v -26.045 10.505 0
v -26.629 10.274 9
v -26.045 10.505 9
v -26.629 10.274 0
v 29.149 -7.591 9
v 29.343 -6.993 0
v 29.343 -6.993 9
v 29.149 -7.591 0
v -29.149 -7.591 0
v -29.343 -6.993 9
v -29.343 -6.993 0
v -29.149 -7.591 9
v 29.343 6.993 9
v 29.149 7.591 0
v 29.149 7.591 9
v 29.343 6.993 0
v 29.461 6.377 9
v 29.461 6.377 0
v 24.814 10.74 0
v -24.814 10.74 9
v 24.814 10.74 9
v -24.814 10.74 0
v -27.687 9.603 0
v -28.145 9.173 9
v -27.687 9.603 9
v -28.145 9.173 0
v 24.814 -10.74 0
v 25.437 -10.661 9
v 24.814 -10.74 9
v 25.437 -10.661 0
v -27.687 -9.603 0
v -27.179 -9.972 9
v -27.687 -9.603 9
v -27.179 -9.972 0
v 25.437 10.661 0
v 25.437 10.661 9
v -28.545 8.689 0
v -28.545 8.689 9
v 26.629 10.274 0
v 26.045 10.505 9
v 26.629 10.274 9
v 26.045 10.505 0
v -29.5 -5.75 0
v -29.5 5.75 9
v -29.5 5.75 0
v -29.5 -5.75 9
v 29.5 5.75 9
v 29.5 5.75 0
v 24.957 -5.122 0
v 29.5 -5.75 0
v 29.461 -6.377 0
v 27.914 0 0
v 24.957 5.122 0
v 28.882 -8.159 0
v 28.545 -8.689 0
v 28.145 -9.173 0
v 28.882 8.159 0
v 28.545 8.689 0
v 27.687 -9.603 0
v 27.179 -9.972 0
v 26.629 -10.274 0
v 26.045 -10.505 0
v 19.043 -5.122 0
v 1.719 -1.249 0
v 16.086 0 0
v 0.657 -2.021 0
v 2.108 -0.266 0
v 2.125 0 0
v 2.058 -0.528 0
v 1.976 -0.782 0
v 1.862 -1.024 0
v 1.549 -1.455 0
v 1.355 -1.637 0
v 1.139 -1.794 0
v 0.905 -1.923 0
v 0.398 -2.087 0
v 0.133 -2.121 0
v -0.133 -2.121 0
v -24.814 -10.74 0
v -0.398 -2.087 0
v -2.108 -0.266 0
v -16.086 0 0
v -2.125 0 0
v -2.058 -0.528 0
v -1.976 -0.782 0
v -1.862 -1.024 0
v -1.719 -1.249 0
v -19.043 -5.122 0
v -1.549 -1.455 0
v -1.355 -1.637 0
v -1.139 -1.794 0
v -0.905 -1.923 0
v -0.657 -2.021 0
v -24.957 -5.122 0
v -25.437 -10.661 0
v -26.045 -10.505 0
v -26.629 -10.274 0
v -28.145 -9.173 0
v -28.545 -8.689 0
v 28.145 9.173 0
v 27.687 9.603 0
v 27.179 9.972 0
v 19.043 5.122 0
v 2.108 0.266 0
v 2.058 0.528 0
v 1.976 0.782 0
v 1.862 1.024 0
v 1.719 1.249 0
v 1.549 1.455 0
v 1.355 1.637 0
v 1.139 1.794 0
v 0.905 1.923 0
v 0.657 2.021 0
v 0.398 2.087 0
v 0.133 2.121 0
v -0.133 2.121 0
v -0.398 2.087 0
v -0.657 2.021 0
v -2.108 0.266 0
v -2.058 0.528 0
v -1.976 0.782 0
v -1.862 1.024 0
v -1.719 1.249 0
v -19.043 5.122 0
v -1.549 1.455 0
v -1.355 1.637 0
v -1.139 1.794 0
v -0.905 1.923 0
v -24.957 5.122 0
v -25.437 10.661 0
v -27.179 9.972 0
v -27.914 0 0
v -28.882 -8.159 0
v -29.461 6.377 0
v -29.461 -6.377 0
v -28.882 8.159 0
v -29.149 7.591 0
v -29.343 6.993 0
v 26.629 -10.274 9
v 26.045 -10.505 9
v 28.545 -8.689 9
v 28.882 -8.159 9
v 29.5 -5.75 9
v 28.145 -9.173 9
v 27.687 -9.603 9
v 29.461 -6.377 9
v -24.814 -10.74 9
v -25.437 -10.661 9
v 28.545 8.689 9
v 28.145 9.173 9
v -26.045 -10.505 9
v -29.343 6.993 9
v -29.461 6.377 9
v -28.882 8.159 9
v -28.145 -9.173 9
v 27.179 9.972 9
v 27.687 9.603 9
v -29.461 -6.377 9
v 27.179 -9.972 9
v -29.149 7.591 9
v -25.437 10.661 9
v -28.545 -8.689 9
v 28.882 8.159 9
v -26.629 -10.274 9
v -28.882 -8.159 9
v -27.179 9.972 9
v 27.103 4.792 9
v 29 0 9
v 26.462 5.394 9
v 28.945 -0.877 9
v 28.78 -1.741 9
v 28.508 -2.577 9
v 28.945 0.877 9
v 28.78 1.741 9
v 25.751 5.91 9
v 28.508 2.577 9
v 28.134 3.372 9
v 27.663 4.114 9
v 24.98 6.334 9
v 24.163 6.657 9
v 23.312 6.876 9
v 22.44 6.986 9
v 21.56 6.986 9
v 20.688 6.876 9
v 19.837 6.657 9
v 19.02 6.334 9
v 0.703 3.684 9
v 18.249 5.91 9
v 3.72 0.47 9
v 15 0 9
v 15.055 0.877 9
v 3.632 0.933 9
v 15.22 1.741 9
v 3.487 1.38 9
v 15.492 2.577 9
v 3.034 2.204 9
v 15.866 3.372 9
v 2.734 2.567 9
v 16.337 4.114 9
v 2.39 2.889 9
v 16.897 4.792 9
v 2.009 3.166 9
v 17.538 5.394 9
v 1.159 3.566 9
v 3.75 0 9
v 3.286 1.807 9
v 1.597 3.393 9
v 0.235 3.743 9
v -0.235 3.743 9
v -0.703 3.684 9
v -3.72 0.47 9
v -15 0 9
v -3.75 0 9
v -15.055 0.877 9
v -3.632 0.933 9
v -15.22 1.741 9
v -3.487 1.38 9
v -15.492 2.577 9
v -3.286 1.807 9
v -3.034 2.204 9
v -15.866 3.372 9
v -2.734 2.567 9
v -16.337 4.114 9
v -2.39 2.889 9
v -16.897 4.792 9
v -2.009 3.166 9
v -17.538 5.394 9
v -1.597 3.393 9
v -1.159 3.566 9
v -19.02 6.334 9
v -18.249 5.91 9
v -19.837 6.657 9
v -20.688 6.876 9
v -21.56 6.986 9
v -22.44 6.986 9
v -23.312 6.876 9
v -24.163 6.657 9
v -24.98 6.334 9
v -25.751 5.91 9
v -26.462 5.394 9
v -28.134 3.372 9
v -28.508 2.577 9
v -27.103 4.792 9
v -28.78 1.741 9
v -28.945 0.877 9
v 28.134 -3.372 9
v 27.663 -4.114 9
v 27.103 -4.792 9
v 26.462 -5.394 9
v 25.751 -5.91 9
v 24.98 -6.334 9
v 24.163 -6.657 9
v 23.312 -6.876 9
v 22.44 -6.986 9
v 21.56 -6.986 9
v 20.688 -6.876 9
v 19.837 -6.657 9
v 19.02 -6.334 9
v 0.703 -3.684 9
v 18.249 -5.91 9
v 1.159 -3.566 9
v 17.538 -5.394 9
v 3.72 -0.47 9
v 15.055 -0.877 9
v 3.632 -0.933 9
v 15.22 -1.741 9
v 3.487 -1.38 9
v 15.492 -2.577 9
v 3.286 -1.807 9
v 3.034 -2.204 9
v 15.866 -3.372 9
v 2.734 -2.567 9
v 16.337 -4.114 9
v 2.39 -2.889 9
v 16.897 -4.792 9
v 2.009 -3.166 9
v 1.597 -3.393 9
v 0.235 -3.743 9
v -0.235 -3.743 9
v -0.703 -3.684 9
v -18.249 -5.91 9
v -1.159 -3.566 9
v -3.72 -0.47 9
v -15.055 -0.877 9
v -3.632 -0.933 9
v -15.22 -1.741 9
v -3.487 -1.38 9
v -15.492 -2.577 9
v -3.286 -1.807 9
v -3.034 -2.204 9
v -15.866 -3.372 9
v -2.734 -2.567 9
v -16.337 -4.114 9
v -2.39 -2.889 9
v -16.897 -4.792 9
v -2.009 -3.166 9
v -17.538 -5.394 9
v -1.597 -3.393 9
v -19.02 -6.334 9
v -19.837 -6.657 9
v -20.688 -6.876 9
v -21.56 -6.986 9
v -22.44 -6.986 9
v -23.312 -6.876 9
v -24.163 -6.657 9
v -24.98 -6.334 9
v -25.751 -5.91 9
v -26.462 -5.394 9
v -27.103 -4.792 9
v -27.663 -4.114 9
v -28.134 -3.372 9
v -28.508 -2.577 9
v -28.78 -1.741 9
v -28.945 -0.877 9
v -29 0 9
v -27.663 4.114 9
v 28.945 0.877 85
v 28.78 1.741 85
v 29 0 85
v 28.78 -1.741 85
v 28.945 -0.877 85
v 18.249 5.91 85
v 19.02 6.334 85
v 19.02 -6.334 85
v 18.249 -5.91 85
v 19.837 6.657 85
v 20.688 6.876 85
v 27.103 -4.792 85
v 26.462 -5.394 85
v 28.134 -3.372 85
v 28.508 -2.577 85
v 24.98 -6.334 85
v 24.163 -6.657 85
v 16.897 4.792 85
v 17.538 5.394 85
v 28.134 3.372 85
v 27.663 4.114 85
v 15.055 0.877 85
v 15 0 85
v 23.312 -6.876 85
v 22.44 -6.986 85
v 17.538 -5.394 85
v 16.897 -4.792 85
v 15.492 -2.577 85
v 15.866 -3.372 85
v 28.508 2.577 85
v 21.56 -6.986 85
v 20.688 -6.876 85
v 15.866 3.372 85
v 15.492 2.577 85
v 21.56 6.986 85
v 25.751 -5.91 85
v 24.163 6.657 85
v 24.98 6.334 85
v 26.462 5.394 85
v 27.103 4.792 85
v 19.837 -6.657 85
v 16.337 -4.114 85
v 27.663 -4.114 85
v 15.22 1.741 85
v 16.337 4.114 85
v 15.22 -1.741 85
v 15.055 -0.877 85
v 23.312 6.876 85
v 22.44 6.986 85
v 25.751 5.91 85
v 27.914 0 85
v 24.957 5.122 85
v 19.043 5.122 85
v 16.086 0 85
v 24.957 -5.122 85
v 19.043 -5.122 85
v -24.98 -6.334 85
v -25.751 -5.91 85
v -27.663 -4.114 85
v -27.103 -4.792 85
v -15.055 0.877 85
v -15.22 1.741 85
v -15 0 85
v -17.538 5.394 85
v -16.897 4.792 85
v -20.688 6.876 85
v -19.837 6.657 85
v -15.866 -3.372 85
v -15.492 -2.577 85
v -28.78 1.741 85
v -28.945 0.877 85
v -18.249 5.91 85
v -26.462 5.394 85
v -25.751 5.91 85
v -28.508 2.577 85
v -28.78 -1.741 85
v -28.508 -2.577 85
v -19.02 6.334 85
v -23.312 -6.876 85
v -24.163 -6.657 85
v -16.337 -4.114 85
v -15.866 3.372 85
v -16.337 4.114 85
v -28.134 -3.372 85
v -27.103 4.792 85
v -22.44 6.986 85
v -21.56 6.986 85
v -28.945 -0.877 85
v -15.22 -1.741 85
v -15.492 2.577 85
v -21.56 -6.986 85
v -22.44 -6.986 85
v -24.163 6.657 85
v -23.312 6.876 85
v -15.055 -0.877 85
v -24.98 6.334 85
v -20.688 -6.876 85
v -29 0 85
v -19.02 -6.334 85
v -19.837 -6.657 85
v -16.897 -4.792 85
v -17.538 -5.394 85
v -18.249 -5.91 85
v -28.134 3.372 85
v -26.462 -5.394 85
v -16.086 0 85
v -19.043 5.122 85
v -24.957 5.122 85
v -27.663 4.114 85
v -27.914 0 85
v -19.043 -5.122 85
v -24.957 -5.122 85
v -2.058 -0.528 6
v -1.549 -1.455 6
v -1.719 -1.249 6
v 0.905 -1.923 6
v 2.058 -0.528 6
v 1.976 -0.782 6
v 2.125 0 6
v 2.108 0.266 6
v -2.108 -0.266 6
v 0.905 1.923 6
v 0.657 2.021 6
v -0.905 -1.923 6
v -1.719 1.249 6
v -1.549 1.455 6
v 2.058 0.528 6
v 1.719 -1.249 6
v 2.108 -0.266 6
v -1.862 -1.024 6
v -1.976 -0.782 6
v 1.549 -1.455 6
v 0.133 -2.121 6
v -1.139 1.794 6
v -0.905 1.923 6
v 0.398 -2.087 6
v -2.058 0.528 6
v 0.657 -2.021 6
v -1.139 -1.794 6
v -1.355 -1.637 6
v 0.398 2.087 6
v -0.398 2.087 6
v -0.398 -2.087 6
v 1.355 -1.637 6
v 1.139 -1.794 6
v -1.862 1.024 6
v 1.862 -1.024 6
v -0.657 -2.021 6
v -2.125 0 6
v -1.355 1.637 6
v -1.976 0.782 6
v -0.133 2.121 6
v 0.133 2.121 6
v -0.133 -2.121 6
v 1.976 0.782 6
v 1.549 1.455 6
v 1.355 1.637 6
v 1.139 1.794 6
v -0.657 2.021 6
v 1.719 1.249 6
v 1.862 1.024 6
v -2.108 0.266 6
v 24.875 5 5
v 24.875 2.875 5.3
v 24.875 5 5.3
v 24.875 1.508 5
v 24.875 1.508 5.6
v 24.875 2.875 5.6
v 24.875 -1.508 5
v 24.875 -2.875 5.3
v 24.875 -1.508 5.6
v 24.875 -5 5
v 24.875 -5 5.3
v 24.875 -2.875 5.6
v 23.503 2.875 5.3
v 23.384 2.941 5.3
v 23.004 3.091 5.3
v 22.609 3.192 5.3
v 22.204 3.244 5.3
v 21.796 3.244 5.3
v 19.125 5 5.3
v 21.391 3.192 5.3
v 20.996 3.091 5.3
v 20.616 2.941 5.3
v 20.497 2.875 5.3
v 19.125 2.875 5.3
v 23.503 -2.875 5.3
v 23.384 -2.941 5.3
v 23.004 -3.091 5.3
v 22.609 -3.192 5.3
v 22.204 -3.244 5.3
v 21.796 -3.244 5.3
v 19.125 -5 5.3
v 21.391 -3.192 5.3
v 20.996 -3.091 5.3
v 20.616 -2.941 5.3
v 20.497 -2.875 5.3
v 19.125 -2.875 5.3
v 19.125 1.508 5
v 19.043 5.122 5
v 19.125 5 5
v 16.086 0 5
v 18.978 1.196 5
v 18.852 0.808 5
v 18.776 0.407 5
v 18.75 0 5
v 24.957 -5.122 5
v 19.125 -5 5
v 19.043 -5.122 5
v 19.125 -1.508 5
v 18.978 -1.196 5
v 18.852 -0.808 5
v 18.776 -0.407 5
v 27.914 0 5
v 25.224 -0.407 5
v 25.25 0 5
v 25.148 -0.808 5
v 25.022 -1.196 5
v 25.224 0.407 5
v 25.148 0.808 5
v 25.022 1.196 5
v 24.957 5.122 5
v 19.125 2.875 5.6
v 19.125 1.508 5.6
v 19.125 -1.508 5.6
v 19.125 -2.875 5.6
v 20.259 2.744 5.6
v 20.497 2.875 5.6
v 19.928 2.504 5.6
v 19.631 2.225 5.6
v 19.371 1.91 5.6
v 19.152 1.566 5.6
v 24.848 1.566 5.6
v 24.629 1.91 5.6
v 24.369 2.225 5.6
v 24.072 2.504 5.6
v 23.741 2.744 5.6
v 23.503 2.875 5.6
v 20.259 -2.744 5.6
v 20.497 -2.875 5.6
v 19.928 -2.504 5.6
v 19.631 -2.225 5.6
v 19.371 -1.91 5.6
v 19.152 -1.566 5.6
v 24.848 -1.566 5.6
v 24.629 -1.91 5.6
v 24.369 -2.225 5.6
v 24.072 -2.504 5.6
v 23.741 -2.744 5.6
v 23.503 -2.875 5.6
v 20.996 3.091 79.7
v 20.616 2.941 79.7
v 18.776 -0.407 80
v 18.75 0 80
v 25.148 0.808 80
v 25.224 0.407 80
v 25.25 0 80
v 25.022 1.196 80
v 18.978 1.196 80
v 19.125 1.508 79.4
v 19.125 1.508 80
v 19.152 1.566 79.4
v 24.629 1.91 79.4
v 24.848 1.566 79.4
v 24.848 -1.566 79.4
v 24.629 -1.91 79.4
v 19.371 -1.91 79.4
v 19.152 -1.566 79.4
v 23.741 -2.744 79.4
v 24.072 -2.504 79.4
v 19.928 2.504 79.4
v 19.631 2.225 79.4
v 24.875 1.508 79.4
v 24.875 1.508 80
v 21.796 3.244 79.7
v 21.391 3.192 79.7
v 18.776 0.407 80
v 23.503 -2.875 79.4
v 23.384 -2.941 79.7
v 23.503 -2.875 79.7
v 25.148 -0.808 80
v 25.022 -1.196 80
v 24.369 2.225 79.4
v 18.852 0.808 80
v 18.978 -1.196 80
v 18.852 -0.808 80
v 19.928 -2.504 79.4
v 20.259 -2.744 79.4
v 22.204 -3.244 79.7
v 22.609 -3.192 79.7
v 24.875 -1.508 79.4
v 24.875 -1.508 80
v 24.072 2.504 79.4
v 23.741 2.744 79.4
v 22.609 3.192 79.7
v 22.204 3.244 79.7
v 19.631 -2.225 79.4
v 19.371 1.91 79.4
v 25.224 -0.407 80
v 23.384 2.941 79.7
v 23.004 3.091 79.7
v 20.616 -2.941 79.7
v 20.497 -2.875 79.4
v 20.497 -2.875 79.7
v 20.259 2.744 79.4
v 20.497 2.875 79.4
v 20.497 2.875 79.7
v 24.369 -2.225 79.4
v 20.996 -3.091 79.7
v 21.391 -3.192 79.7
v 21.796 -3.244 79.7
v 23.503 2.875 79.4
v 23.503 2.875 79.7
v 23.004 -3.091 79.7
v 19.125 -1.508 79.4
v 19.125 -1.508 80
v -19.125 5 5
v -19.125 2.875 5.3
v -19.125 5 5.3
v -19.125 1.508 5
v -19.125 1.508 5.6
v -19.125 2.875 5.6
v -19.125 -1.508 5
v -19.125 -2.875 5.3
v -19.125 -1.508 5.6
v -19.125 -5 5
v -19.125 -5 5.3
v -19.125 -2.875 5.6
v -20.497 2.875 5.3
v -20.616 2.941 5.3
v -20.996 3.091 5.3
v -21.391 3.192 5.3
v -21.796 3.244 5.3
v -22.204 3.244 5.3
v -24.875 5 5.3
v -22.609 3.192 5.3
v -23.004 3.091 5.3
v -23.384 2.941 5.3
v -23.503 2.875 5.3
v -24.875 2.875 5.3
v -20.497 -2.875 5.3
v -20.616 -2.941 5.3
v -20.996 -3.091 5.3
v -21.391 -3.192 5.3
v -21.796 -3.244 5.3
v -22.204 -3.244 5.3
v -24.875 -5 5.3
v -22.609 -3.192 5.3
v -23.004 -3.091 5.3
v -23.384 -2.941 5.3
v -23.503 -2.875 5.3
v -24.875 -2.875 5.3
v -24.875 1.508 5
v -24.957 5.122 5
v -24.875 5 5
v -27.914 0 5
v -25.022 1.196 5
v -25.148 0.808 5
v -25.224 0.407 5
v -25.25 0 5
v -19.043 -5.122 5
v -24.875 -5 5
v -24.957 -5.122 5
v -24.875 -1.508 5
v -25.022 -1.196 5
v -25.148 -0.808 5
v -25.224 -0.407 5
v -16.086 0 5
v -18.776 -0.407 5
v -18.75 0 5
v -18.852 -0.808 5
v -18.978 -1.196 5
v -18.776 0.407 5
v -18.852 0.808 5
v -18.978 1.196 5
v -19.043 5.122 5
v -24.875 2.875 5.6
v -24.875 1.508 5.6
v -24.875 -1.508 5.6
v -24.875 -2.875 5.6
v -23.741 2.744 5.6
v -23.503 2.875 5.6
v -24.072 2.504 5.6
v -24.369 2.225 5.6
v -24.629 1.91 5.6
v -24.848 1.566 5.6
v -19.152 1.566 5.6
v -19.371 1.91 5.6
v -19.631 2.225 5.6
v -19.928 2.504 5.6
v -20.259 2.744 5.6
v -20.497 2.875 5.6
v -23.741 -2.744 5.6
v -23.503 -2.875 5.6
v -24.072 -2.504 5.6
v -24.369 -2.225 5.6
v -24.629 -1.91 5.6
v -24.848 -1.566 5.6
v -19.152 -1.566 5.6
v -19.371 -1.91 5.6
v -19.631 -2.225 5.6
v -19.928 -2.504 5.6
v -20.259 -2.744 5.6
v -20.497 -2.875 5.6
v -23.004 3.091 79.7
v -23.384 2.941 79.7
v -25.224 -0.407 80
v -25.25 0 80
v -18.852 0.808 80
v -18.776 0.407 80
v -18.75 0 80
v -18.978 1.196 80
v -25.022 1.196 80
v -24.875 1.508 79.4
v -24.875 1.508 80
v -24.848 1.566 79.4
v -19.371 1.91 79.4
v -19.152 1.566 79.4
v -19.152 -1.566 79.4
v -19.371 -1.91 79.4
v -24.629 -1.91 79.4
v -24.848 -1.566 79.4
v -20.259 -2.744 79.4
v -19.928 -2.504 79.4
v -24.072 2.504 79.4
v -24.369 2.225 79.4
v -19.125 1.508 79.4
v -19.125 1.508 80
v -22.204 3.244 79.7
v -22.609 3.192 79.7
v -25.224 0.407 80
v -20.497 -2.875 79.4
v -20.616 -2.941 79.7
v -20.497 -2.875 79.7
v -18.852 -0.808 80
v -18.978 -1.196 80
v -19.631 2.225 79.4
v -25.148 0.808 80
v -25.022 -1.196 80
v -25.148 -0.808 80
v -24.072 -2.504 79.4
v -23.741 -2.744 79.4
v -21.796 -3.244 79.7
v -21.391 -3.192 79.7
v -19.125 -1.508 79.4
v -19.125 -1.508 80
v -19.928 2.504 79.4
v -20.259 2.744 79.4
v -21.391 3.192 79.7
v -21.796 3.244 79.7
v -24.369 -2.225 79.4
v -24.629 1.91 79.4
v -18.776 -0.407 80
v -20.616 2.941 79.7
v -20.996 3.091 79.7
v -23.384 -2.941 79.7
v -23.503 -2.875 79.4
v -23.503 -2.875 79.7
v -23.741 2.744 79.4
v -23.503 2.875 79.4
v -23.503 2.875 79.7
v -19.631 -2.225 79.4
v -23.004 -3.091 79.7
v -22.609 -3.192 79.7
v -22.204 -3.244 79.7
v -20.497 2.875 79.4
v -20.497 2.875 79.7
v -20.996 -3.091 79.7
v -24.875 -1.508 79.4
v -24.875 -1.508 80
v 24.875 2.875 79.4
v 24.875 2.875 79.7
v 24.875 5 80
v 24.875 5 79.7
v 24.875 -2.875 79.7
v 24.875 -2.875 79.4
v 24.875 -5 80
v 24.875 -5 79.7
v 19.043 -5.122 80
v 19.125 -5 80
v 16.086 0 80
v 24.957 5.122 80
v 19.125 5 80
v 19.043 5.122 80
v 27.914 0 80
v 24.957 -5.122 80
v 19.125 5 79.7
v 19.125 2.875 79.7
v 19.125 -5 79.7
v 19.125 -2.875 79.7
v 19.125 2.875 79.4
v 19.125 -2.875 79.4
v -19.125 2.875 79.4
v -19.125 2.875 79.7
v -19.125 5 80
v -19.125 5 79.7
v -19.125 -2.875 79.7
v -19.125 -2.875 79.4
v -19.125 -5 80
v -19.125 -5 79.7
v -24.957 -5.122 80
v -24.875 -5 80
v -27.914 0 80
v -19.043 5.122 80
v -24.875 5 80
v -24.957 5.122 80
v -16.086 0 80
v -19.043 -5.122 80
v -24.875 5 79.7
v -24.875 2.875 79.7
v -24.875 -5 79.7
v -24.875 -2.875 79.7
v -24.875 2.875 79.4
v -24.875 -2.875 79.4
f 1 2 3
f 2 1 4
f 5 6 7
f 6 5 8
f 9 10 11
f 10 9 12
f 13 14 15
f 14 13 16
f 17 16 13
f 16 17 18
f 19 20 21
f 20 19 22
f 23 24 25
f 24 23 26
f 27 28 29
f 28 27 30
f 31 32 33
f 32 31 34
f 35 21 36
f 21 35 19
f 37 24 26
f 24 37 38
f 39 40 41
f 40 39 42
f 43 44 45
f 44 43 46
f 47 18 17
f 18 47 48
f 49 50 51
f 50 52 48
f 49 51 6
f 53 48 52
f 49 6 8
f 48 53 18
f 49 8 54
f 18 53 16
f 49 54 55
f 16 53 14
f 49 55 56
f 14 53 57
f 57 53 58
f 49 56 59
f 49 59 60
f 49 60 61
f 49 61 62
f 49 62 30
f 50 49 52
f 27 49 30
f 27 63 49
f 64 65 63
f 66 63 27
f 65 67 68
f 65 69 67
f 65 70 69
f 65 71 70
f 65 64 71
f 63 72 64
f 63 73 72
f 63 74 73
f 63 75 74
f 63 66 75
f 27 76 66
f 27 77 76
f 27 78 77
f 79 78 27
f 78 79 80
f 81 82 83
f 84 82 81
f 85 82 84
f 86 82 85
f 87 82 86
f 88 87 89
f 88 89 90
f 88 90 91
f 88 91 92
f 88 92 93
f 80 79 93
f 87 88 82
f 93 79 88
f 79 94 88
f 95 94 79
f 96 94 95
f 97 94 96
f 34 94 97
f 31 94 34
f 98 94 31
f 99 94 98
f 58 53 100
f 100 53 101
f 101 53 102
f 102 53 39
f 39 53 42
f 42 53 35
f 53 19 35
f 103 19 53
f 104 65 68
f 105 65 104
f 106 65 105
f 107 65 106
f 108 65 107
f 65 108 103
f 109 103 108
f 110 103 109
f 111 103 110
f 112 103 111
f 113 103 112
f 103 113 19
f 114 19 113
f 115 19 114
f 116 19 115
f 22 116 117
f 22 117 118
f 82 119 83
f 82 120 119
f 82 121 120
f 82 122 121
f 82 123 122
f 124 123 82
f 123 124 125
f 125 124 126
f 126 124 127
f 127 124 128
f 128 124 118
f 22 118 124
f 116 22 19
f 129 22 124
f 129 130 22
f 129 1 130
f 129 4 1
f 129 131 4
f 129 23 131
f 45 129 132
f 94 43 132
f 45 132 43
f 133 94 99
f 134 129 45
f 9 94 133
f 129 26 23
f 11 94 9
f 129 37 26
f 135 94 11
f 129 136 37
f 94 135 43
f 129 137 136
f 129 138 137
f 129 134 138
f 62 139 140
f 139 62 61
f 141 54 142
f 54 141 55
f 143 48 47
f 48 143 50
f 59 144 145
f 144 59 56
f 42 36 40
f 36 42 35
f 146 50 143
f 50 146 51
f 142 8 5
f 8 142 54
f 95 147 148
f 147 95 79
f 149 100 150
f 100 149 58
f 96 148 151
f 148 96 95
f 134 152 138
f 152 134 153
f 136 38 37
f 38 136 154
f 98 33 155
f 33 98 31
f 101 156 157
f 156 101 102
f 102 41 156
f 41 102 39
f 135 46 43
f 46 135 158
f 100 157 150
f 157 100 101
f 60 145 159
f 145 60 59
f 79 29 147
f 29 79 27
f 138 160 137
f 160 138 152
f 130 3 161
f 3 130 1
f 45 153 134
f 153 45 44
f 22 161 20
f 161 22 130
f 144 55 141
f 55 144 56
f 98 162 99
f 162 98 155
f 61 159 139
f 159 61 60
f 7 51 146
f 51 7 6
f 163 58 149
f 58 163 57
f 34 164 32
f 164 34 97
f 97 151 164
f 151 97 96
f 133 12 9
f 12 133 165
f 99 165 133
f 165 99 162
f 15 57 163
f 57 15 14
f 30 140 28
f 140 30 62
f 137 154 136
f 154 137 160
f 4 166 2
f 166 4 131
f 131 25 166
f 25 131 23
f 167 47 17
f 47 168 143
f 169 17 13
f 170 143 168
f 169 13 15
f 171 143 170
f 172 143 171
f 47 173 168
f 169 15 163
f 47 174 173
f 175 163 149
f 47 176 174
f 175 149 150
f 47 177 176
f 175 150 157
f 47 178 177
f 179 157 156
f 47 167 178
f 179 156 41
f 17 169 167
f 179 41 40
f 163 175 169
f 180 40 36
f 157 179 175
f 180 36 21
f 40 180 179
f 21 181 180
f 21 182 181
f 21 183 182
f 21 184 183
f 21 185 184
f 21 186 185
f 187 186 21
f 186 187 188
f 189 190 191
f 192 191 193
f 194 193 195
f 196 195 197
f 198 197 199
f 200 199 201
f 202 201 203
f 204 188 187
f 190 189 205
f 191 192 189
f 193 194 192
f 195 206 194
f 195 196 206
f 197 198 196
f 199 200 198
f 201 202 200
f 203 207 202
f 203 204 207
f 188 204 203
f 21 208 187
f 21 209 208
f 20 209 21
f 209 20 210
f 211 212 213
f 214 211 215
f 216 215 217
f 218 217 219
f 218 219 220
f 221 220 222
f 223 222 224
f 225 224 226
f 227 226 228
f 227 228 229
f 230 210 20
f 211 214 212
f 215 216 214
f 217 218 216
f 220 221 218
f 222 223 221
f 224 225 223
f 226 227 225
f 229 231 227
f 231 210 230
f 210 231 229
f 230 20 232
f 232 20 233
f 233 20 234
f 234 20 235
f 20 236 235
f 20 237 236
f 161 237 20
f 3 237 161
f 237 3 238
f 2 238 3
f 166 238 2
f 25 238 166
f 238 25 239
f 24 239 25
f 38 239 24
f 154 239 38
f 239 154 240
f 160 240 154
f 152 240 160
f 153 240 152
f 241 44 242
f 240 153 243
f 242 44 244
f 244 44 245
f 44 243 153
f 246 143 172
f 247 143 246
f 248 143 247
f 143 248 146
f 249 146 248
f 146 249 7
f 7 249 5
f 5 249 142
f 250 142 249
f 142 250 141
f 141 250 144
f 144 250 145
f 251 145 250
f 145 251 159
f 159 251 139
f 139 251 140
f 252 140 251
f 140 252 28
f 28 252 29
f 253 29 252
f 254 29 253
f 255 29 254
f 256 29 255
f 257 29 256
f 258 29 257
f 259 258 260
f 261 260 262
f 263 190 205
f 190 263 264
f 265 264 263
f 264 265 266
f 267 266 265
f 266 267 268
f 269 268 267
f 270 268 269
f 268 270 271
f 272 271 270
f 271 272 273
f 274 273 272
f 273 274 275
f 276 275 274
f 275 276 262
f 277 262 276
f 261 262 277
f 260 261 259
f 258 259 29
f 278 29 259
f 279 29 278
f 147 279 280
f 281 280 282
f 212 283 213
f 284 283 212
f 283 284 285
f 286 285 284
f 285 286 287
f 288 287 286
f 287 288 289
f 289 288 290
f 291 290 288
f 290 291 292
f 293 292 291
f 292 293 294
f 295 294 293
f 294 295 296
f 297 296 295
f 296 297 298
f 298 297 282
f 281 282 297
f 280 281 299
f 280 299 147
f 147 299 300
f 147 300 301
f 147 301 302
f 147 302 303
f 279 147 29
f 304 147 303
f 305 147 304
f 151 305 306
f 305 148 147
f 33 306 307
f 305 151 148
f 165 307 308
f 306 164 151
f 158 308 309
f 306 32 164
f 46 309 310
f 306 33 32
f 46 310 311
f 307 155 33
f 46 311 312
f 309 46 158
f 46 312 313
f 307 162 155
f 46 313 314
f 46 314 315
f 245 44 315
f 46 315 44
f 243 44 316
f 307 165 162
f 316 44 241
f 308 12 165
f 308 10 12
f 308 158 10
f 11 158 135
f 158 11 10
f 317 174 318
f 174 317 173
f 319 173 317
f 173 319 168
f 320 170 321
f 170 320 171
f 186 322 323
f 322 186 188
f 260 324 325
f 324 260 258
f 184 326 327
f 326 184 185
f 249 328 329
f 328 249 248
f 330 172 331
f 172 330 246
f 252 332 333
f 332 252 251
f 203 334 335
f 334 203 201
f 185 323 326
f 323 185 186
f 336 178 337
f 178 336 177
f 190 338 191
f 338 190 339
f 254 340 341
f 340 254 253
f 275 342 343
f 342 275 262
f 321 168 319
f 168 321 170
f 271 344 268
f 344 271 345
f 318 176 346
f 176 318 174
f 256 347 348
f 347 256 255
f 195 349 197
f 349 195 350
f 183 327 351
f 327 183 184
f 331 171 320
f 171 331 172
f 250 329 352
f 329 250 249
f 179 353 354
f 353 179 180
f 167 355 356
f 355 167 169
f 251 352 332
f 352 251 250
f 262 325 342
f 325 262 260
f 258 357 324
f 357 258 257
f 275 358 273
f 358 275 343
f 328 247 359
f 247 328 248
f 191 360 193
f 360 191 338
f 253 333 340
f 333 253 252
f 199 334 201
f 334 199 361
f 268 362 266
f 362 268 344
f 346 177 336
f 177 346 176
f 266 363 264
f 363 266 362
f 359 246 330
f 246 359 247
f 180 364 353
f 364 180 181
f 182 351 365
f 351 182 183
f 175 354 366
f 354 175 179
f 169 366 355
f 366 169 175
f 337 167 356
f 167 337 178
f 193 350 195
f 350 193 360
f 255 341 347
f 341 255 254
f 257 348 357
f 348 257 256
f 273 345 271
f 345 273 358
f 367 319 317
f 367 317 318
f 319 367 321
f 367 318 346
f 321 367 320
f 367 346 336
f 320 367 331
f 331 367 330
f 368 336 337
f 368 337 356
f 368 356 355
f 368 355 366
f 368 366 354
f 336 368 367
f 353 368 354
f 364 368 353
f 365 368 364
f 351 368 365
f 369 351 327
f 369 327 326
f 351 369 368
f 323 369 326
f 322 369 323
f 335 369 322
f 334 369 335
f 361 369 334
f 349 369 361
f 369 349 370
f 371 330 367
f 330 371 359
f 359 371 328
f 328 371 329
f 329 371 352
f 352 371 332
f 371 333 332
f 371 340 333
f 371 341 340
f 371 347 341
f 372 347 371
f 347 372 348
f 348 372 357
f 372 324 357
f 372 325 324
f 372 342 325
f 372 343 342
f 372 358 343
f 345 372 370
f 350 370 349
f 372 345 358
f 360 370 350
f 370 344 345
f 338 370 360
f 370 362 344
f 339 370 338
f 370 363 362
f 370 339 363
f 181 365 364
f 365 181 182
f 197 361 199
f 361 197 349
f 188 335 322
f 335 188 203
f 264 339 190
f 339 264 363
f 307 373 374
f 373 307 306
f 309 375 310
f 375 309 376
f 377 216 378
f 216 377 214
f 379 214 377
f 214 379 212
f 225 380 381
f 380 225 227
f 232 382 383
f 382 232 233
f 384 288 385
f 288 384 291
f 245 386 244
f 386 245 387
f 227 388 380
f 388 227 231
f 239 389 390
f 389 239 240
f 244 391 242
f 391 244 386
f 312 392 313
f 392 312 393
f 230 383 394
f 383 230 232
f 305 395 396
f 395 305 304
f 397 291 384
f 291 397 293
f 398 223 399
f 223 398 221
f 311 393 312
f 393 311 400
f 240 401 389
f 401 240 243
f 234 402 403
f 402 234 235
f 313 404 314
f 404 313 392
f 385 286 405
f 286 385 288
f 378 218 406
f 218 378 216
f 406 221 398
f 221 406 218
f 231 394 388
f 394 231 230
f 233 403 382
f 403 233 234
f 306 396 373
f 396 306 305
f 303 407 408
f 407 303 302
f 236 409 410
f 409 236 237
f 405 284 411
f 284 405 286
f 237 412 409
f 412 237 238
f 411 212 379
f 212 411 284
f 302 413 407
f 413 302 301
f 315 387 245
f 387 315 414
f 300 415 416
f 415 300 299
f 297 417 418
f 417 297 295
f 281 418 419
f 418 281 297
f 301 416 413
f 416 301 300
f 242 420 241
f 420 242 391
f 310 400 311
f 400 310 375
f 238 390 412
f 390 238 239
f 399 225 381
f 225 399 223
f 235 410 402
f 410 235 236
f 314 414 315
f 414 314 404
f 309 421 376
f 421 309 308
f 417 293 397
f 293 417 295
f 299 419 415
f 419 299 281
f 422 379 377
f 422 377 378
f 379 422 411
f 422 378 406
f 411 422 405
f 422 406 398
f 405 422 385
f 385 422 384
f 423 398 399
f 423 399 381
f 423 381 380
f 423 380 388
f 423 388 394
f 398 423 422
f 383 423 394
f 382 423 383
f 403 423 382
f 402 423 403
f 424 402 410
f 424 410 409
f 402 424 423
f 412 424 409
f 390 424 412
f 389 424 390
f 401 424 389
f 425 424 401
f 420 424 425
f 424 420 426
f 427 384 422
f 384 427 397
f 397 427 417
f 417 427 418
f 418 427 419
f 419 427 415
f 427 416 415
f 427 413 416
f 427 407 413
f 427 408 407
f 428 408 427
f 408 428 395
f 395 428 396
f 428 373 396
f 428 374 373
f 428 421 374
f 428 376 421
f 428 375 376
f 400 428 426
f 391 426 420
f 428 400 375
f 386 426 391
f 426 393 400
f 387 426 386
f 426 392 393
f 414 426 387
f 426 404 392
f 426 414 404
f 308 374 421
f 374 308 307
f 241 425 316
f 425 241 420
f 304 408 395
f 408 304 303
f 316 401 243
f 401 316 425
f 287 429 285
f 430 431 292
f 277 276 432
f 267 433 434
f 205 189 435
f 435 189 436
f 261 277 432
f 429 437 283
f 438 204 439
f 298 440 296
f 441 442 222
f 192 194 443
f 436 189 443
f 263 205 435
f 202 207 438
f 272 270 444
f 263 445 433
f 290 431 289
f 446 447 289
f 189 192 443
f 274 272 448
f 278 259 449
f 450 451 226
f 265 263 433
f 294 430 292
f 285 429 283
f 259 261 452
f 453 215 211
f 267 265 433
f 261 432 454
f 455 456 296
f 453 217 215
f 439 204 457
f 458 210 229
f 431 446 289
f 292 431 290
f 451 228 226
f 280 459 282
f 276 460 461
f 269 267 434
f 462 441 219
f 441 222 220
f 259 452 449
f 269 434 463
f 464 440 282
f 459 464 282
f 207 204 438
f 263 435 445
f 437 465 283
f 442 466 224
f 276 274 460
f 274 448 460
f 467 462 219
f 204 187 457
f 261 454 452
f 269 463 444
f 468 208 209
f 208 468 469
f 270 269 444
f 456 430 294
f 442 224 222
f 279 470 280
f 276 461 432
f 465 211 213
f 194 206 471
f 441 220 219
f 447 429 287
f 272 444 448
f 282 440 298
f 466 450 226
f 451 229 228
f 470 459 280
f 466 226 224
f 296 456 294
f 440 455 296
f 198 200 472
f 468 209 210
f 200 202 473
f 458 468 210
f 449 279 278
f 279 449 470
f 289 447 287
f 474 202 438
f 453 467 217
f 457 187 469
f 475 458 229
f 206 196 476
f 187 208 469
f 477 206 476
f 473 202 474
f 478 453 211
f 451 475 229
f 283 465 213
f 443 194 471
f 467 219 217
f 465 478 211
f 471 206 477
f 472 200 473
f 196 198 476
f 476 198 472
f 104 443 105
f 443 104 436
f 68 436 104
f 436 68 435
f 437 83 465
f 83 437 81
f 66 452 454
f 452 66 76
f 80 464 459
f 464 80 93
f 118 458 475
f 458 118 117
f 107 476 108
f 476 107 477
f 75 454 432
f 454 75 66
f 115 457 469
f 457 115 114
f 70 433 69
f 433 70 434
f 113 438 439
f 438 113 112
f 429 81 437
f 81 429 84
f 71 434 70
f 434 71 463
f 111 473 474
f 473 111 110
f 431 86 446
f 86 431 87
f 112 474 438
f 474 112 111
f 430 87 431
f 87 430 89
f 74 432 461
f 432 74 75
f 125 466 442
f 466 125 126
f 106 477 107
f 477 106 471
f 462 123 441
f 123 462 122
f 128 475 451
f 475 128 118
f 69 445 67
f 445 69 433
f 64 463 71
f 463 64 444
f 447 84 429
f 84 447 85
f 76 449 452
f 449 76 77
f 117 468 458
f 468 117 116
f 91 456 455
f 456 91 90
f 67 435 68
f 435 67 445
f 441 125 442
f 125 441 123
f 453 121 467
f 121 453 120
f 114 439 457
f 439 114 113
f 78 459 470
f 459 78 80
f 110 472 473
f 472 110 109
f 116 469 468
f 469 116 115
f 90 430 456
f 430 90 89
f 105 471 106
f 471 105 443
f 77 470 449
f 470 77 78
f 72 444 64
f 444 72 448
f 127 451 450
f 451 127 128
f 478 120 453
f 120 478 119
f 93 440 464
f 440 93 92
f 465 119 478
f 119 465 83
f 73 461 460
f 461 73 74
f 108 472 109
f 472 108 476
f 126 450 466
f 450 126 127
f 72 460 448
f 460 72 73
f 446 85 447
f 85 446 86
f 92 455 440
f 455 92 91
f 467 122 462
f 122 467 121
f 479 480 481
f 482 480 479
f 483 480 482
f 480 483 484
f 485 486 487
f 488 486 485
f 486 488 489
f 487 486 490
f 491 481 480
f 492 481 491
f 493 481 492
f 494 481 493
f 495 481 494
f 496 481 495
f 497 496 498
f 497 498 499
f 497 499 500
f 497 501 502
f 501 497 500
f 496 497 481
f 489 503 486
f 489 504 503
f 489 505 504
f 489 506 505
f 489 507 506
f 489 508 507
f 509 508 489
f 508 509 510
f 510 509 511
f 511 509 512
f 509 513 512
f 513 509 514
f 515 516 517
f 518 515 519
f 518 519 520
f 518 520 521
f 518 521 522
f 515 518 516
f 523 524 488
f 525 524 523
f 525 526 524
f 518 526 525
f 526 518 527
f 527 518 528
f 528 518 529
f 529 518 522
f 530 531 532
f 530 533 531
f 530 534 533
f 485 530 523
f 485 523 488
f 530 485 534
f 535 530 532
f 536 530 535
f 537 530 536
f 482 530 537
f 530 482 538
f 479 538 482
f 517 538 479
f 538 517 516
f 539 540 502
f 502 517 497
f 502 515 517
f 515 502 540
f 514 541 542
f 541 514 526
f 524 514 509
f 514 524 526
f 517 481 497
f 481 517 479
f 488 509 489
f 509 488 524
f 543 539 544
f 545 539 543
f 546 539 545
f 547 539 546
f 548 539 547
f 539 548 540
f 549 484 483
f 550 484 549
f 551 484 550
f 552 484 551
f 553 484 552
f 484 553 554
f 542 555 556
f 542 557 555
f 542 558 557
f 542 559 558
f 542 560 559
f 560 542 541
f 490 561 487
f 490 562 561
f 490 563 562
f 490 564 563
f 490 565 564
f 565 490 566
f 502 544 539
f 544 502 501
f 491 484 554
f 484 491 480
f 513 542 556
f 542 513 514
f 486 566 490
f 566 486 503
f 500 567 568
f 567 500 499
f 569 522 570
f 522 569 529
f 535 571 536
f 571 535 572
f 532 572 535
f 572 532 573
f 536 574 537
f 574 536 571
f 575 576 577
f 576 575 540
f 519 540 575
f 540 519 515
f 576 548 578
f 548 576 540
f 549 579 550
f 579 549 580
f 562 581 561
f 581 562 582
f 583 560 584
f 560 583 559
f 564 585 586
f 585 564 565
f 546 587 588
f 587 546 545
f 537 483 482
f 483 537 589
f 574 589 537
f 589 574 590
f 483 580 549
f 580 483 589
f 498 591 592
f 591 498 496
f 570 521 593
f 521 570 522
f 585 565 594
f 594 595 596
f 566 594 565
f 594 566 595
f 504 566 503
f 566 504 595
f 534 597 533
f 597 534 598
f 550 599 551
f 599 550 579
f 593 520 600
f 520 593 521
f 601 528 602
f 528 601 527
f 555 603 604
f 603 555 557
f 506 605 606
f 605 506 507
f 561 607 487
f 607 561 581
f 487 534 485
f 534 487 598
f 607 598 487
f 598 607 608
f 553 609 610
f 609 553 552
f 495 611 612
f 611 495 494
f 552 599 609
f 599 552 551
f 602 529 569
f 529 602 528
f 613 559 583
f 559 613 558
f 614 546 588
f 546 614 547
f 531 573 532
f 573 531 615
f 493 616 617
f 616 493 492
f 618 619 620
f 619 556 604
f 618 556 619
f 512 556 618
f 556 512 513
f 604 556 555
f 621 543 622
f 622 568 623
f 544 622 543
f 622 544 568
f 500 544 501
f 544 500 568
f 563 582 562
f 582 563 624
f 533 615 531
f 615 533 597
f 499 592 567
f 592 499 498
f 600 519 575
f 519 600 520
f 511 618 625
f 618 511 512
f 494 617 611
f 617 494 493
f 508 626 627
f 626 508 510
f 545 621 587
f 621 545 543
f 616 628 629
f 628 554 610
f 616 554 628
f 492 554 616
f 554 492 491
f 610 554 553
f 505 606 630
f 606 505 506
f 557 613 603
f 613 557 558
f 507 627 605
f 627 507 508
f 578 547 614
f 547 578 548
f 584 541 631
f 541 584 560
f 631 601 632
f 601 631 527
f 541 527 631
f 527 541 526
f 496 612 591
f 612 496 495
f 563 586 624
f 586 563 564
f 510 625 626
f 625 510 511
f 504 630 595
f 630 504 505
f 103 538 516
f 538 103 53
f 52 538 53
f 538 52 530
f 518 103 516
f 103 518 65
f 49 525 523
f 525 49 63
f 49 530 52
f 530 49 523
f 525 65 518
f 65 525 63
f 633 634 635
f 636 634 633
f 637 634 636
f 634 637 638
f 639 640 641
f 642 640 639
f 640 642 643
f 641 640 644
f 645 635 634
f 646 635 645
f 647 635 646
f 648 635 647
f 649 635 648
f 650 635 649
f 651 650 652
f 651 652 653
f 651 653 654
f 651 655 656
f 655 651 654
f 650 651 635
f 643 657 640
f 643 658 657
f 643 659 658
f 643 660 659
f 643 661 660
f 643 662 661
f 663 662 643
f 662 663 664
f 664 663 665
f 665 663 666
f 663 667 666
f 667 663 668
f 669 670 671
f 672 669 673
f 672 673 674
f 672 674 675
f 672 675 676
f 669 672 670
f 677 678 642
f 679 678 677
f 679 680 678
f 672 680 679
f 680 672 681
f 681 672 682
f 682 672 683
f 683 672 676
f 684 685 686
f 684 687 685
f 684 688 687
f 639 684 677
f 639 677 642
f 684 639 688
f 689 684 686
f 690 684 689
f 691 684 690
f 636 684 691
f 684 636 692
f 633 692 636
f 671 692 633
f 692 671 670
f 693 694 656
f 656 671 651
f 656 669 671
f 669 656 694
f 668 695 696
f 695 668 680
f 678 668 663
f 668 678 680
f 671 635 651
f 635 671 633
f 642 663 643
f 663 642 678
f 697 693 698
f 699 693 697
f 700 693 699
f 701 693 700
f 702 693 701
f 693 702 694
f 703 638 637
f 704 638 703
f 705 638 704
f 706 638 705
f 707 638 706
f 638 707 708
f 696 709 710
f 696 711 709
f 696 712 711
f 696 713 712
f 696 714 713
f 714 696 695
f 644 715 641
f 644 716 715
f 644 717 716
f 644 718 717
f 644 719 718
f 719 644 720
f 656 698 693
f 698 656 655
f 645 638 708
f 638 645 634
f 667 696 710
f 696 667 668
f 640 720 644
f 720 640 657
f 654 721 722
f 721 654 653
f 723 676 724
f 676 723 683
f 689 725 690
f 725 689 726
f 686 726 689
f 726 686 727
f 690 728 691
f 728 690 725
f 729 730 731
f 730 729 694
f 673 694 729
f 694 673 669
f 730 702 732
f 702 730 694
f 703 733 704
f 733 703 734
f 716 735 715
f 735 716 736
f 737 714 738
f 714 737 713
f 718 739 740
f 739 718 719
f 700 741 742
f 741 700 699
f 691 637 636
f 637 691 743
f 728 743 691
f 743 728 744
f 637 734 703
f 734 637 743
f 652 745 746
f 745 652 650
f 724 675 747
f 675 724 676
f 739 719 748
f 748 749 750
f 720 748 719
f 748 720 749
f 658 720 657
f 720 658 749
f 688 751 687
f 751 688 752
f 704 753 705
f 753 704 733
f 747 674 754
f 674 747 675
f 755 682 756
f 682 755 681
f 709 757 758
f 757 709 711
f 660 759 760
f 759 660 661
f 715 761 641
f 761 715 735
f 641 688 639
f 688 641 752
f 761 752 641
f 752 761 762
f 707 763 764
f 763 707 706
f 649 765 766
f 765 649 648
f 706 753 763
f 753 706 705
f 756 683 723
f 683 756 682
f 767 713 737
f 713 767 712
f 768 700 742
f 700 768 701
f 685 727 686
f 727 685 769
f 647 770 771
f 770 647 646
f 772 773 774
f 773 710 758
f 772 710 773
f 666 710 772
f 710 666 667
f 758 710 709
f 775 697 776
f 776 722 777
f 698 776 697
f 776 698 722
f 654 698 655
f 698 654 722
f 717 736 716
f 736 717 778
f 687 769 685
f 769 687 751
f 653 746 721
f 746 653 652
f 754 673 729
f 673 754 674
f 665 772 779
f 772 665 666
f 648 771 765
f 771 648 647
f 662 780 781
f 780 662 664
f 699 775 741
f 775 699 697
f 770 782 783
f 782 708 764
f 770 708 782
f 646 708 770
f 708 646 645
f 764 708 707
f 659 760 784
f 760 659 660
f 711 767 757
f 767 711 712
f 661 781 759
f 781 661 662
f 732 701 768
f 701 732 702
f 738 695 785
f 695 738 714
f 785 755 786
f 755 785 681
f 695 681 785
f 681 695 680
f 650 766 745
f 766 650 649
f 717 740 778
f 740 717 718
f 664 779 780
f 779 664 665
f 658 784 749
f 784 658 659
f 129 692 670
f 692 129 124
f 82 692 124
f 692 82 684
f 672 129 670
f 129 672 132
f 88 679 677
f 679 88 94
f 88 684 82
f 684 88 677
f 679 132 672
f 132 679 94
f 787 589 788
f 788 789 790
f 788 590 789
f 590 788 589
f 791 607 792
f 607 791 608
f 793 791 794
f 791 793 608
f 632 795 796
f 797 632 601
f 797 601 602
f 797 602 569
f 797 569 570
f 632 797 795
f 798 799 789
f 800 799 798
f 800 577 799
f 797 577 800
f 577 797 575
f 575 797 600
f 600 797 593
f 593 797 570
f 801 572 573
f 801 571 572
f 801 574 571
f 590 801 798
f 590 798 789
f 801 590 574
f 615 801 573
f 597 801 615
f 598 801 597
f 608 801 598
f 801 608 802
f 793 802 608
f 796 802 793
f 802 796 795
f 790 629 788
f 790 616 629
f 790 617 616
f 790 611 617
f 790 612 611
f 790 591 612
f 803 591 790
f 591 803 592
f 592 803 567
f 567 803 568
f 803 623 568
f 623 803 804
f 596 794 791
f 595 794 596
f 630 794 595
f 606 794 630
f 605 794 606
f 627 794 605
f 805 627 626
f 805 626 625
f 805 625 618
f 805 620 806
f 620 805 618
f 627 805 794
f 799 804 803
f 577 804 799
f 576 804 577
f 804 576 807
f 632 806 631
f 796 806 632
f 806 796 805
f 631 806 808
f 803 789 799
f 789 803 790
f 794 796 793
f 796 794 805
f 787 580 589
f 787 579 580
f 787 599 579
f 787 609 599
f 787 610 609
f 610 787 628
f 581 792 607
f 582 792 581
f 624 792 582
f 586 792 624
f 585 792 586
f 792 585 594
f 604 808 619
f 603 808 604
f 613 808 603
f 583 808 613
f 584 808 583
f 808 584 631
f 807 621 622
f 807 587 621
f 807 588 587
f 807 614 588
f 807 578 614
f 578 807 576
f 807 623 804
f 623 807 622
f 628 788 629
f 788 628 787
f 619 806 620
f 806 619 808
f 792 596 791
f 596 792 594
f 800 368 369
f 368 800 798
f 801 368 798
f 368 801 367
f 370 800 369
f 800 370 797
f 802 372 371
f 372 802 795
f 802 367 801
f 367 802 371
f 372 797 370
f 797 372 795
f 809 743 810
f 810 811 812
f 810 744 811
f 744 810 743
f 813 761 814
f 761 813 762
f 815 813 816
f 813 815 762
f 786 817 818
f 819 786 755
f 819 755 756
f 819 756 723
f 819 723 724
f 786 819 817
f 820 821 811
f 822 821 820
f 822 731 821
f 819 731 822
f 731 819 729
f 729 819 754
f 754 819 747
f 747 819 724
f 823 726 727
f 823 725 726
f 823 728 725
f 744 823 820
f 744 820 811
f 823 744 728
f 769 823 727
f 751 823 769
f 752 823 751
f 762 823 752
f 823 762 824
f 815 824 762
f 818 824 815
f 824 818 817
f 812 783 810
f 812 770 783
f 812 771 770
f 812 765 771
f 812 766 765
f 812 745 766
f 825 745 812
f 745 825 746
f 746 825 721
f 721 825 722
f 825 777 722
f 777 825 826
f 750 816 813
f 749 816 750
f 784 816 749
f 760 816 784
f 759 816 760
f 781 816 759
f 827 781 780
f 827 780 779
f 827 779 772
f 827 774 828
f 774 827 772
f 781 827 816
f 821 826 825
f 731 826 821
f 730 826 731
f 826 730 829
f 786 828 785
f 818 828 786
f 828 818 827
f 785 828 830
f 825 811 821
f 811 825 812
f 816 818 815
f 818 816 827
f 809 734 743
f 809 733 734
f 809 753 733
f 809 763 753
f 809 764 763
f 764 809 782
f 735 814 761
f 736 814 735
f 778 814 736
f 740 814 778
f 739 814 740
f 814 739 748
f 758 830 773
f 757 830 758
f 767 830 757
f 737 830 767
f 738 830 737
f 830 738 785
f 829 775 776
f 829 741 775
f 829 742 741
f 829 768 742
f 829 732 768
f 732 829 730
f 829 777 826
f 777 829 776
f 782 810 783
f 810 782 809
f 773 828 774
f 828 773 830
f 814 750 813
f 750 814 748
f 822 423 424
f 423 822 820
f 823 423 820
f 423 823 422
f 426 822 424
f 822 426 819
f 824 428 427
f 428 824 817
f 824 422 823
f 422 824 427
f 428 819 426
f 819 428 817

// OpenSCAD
$fn = 50;


difference() {
	union() {
		hull() {
			translate(v = [-24.5000000000, 5.7500000000, 0]) {
				cylinder(h = 9, r = 5);
			}
			translate(v = [24.5000000000, 5.7500000000, 0]) {
				cylinder(h = 9, r = 5);
			}
			translate(v = [-24.5000000000, -5.7500000000, 0]) {
				cylinder(h = 9, r = 5);
			}
			translate(v = [24.5000000000, -5.7500000000, 0]) {
				cylinder(h = 9, r = 5);
			}
		}
		translate(v = [22.0000000000, 0, 0.0000000000]) {
			cylinder(h = 85, r = 7.0000000000);
		}
		translate(v = [-22.0000000000, 0, 0.0000000000]) {
			cylinder(h = 85, r = 7.0000000000);
		}
		translate(v = [22.0000000000, 0, 79.0000000000]) {
			cylinder(h = 6, r = 7.0000000000);
		}
		translate(v = [-22.0000000000, 0, 79.0000000000]) {
			cylinder(h = 6, r = 7.0000000000);
		}
	}
	union() {
		translate(v = [0, 0, 9]) {
			rotate(a = [0, 0, 0]) {
				difference() {
					union() {
						#translate(v = [0, 0, -80.0000000000]) {
							cylinder(h = 80, r = 2.0000000000);
						}
						#translate(v = [0, 0, -3]) {
							cylinder(h = 3, r1 = 2.1250000000, r2 = 3.7500000000);
						}
						#translate(v = [0, 0, -80.0000000000]) {
							cylinder(h = 80, r = 2.1250000000);
						}
						#translate(v = [0, 0, -80.0000000000]) {
							cylinder(h = 80, r = 2.0000000000);
						}
					}
					union();
				}
			}
		}
		translate(v = [22.0000000000, 0, 0]) {
			rotate(a = [0, 0, 0]) {
				difference() {
					union() {
						#translate(v = [-2.8750000000, -5.0000000000, -0.3000000000]) {
							cube(size = [5.7500000000, 10, 0.3000000000]);
						}
						#translate(v = [-2.8750000000, -2.8750000000, -0.6000000000]) {
							cube(size = [5.7500000000, 5.7500000000, 0.3000000000]);
						}
						#translate(v = [-2.8750000000, -5.0000000000, 5]) {
							cube(size = [5.7500000000, 10, 0.3000000000]);
						}
						#translate(v = [-2.8750000000, -2.8750000000, 5.3000000000]) {
							cube(size = [5.7500000000, 5.7500000000, 0.3000000000]);
						}
						#translate(v = [0, 0, -100.0000000000]) {
							cylinder(h = 200, r = 3.2500000000);
						}
						#linear_extrude(height = 5) {
							polygon(points = [[5.9142500000, 0.0000000000], [2.9571250000, 5.1218907443], [-2.9571250000, 5.1218907443], [-5.9142500000, 0.0000000000], [-2.9571250000, -5.1218907443], [2.9571250000, -5.1218907443]]);
						}
						#translate(v = [-2.8750000000, -5.0000000000, -0.3000000000]) {
							cube(size = [5.7500000000, 10, 0.3000000000]);
						}
						#translate(v = [-2.8750000000, -2.8750000000, -0.6000000000]) {
							cube(size = [5.7500000000, 5.7500000000, 0.3000000000]);
						}
						#translate(v = [-2.8750000000, -5.0000000000, 5]) {
							cube(size = [5.7500000000, 10, 0.3000000000]);
						}
						#translate(v = [-2.8750000000, -2.8750000000, 5.3000000000]) {
							cube(size = [5.7500000000, 5.7500000000, 0.3000000000]);
						}
						#translate(v = [0, 0, -100.0000000000]) {
							cylinder(h = 200, r = 3.2500000000);
						}
						#translate(v = [-2.8750000000, -5.0000000000, -0.3000000000]) {
							cube(size = [5.7500000000, 10, 0.3000000000]);
						}
						#translate(v = [-2.8750000000, -2.8750000000, -0.6000000000]) {
							cube(size = [5.7500000000, 5.7500000000, 0.3000000000]);
						}
						#translate(v = [-2.8750000000, -5.0000000000, 5]) {
							cube(size = [5.7500000000, 10, 0.3000000000]);
						}
						#translate(v = [-2.8750000000, -2.8750000000, 5.3000000000]) {
							cube(size = [5.7500000000, 5.7500000000, 0.3000000000]);
						}
						#translate(v = [0, 0, -100.0000000000]) {
							cylinder(h = 200, r = 3.2500000000);
						}
					}
					union();
				}
			}
		}
		translate(v = [-22.0000000000, 0, 0]) {
			rotate(a = [0, 0, 0]) {
				difference() {
					union() {
						#translate(v = [-2.8750000000, -5.0000000000, -0.3000000000]) {
							cube(size = [5.7500000000, 10, 0.3000000000]);
						}
						#translate(v = [-2.8750000000, -2.8750000000, -0.6000000000]) {
							cube(size = [5.7500000000, 5.7500000000, 0.3000000000]);
						}
						#translate(v = [-2.8750000000, -5.0000000000, 5]) {
							cube(size = [5.7500000000, 10, 0.3000000000]);
						}
						#translate(v = [-2.8750000000, -2.8750000000, 5.3000000000]) {
							cube(size = [5.7500000000, 5.7500000000, 0.3000000000]);
						}
						#translate(v = [0, 0, -100.0000000000]) {
							cylinder(h = 200, r = 3.2500000000);
						}
						#linear_extrude(height = 5) {
							polygon(points = [[5.9142500000, 0.0000000000], [2.9571250000, 5.1218907443], [-2.9571250000, 5.1218907443], [-5.9142500000, 0.0000000000], [-2.9571250000, -5.1218907443], [2.9571250000, -5.1218907443]]);
						}
						#translate(v = [-2.8750000000, -5.0000000000, -0.3000000000]) {
							cube(size = [5.7500000000, 10, 0.3000000000]);
						}
						#translate(v = [-2.8750000000, -2.8750000000, -0.6000000000]) {
							cube(size = [5.7500000000, 5.7500000000, 0.3000000000]);
						}
						#translate(v = [-2.8750000000, -5.0000000000, 5]) {
							cube(size = [5.7500000000, 10, 0.3000000000]);
						}
						#translate(v = [-2.8750000000, -2.8750000000, 5.3000000000]) {
							cube(size = [5.7500000000, 5.7500000000, 0.3000000000]);
						}
						#translate(v = [0, 0, -100.0000000000]) {
							cylinder(h = 200, r = 3.2500000000);
						}
						#translate(v = [-2.8750000000, -5.0000000000, -0.3000000000]) {
							cube(size = [5.7500000000, 10, 0.3000000000]);
						}
						#translate(v = [-2.8750000000, -2.8750000000, -0.6000000000]) {
							cube(size = [5.7500000000, 5.7500000000, 0.3000000000]);
						}
						#translate(v = [-2.8750000000, -5.0000000000, 5]) {
							cube(size = [5.7500000000, 10, 0.3000000000]);
						}
						#translate(v = [-2.8750000000, -2.8750000000, 5.3000000000]) {
							cube(size = [5.7500000000, 5.7500000000, 0.3000000000]);
						}
						#translate(v = [0, 0, -100.0000000000]) {
							cylinder(h = 200, r = 3.2500000000);
						}
					}
					union();
				}
			}
		}
		translate(v = [22.0000000000, 0, 85]) {
			rotate(a = [0, 0, 0]) {
				difference() {
					union() {
						#translate(v = [-2.8750000000, -5.0000000000, -5.3000000000]) {
							cube(size = [5.7500000000, 10, 0.3000000000]);
						}
						#translate(v = [-2.8750000000, -2.8750000000, -5.6000000000]) {
							cube(size = [5.7500000000, 5.7500000000, 0.3000000000]);
						}
						#translate(v = [-2.8750000000, -5.0000000000, 0]) {
							cube(size = [5.7500000000, 10, 0.3000000000]);
						}
						#translate(v = [-2.8750000000, -2.8750000000, 0.3000000000]) {
							cube(size = [5.7500000000, 5.7500000000, 0.3000000000]);
						}
						#translate(v = [0, 0, -100.0000000000]) {
							cylinder(h = 200, r = 3.2500000000);
						}
						translate(v = [0, 0, -5]) {
							#linear_extrude(height = 5) {
								polygon(points = [[5.9142500000, 0.0000000000], [2.9571250000, 5.1218907443], [-2.9571250000, 5.1218907443], [-5.9142500000, 0.0000000000], [-2.9571250000, -5.1218907443], [2.9571250000, -5.1218907443]]);
							}
						}
						#translate(v = [-2.8750000000, -5.0000000000, -5.3000000000]) {
							cube(size = [5.7500000000, 10, 0.3000000000]);
						}
						#translate(v = [-2.8750000000, -2.8750000000, -5.6000000000]) {
							cube(size = [5.7500000000, 5.7500000000, 0.3000000000]);
						}
						#translate(v = [-2.8750000000, -5.0000000000, 0]) {
							cube(size = [5.7500000000, 10, 0.3000000000]);
						}
						#translate(v = [-2.8750000000, -2.8750000000, 0.3000000000]) {
							cube(size = [5.7500000000, 5.7500000000, 0.3000000000]);
						}
						#translate(v = [0, 0, -100.0000000000]) {
							cylinder(h = 200, r = 3.2500000000);
						}
						#translate(v = [-2.8750000000, -5.0000000000, -5.3000000000]) {
							cube(size = [5.7500000000, 10, 0.3000000000]);
						}
						#translate(v = [-2.8750000000, -2.8750000000, -5.6000000000]) {
							cube(size = [5.7500000000, 5.7500000000, 0.3000000000]);
						}
						#translate(v = [-2.8750000000, -5.0000000000, 0]) {
							cube(size = [5.7500000000, 10, 0.3000000000]);
						}
						#translate(v = [-2.8750000000, -2.8750000000, 0.3000000000]) {
							cube(size = [5.7500000000, 5.7500000000, 0.3000000000]);
						}
						#translate(v = [0, 0, -100.0000000000]) {
							cylinder(h = 200, r = 3.2500000000);
						}
					}
					union();
				}
			}
		}
		translate(v = [-22.0000000000, 0, 85]) {
			rotate(a = [0, 0, 0]) {
				difference() {
					union() {
						#translate(v = [-2.8750000000, -5.0000000000, -5.3000000000]) {
							cube(size = [5.7500000000, 10, 0.3000000000]);
						}
						#translate(v = [-2.8750000000, -2.8750000000, -5.6000000000]) {
							cube(size = [5.7500000000, 5.7500000000, 0.3000000000]);
						}
						#translate(v = [-2.8750000000, -5.0000000000, 0]) {
							cube(size = [5.7500000000, 10, 0.3000000000]);
						}
						#translate(v = [-2.8750000000, -2.8750000000, 0.3000000000]) {
							cube(size = [5.7500000000, 5.7500000000, 0.3000000000]);
						}
						#translate(v = [0, 0, -100.0000000000]) {
							cylinder(h = 200, r = 3.2500000000);
						}
						translate(v = [0, 0, -5]) {
							#linear_extrude(height = 5) {
								polygon(points = [[5.9142500000, 0.0000000000], [2.9571250000, 5.1218907443], [-2.9571250000, 5.1218907443], [-5.9142500000, 0.0000000000], [-2.9571250000, -5.1218907443], [2.9571250000, -5.1218907443]]);
							}
						}
						#translate(v = [-2.8750000000, -5.0000000000, -5.3000000000]) {
							cube(size = [5.7500000000, 10, 0.3000000000]);
						}
						#translate(v = [-2.8750000000, -2.8750000000, -5.6000000000]) {
							cube(size = [5.7500000000, 5.7500000000, 0.3000000000]);
						}
						#translate(v = [-2.8750000000, -5.0000000000, 0]) {
							cube(size = [5.7500000000, 10, 0.3000000000]);
						}
						#translate(v = [-2.8750000000, -2.8750000000, 0.3000000000]) {
							cube(size = [5.7500000000, 5.7500000000, 0.3000000000]);
						}
						#translate(v = [0, 0, -100.0000000000]) {
							cylinder(h = 200, r = 3.2500000000);
						}
						#translate(v = [-2.8750000000, -5.0000000000, -5.3000000000]) {
							cube(size = [5.7500000000, 10, 0.3000000000]);
						}
						#translate(v = [-2.8750000000, -2.8750000000, -5.6000000000]) {
							cube(size = [5.7500000000, 5.7500000000, 0.3000000000]);
						}
						#translate(v = [-2.8750000000, -5.0000000000, 0]) {
							cube(size = [5.7500000000, 10, 0.3000000000]);
						}
						#translate(v = [-2.8750000000, -2.8750000000, 0.3000000000]) {
							cube(size = [5.7500000000, 5.7500000000, 0.3000000000]);
						}
						#translate(v = [0, 0, -100.0000000000]) {
							cylinder(h = 200, r = 3.2500000000);
						}
					}
					union();
				}
			}
		}
	}
}
